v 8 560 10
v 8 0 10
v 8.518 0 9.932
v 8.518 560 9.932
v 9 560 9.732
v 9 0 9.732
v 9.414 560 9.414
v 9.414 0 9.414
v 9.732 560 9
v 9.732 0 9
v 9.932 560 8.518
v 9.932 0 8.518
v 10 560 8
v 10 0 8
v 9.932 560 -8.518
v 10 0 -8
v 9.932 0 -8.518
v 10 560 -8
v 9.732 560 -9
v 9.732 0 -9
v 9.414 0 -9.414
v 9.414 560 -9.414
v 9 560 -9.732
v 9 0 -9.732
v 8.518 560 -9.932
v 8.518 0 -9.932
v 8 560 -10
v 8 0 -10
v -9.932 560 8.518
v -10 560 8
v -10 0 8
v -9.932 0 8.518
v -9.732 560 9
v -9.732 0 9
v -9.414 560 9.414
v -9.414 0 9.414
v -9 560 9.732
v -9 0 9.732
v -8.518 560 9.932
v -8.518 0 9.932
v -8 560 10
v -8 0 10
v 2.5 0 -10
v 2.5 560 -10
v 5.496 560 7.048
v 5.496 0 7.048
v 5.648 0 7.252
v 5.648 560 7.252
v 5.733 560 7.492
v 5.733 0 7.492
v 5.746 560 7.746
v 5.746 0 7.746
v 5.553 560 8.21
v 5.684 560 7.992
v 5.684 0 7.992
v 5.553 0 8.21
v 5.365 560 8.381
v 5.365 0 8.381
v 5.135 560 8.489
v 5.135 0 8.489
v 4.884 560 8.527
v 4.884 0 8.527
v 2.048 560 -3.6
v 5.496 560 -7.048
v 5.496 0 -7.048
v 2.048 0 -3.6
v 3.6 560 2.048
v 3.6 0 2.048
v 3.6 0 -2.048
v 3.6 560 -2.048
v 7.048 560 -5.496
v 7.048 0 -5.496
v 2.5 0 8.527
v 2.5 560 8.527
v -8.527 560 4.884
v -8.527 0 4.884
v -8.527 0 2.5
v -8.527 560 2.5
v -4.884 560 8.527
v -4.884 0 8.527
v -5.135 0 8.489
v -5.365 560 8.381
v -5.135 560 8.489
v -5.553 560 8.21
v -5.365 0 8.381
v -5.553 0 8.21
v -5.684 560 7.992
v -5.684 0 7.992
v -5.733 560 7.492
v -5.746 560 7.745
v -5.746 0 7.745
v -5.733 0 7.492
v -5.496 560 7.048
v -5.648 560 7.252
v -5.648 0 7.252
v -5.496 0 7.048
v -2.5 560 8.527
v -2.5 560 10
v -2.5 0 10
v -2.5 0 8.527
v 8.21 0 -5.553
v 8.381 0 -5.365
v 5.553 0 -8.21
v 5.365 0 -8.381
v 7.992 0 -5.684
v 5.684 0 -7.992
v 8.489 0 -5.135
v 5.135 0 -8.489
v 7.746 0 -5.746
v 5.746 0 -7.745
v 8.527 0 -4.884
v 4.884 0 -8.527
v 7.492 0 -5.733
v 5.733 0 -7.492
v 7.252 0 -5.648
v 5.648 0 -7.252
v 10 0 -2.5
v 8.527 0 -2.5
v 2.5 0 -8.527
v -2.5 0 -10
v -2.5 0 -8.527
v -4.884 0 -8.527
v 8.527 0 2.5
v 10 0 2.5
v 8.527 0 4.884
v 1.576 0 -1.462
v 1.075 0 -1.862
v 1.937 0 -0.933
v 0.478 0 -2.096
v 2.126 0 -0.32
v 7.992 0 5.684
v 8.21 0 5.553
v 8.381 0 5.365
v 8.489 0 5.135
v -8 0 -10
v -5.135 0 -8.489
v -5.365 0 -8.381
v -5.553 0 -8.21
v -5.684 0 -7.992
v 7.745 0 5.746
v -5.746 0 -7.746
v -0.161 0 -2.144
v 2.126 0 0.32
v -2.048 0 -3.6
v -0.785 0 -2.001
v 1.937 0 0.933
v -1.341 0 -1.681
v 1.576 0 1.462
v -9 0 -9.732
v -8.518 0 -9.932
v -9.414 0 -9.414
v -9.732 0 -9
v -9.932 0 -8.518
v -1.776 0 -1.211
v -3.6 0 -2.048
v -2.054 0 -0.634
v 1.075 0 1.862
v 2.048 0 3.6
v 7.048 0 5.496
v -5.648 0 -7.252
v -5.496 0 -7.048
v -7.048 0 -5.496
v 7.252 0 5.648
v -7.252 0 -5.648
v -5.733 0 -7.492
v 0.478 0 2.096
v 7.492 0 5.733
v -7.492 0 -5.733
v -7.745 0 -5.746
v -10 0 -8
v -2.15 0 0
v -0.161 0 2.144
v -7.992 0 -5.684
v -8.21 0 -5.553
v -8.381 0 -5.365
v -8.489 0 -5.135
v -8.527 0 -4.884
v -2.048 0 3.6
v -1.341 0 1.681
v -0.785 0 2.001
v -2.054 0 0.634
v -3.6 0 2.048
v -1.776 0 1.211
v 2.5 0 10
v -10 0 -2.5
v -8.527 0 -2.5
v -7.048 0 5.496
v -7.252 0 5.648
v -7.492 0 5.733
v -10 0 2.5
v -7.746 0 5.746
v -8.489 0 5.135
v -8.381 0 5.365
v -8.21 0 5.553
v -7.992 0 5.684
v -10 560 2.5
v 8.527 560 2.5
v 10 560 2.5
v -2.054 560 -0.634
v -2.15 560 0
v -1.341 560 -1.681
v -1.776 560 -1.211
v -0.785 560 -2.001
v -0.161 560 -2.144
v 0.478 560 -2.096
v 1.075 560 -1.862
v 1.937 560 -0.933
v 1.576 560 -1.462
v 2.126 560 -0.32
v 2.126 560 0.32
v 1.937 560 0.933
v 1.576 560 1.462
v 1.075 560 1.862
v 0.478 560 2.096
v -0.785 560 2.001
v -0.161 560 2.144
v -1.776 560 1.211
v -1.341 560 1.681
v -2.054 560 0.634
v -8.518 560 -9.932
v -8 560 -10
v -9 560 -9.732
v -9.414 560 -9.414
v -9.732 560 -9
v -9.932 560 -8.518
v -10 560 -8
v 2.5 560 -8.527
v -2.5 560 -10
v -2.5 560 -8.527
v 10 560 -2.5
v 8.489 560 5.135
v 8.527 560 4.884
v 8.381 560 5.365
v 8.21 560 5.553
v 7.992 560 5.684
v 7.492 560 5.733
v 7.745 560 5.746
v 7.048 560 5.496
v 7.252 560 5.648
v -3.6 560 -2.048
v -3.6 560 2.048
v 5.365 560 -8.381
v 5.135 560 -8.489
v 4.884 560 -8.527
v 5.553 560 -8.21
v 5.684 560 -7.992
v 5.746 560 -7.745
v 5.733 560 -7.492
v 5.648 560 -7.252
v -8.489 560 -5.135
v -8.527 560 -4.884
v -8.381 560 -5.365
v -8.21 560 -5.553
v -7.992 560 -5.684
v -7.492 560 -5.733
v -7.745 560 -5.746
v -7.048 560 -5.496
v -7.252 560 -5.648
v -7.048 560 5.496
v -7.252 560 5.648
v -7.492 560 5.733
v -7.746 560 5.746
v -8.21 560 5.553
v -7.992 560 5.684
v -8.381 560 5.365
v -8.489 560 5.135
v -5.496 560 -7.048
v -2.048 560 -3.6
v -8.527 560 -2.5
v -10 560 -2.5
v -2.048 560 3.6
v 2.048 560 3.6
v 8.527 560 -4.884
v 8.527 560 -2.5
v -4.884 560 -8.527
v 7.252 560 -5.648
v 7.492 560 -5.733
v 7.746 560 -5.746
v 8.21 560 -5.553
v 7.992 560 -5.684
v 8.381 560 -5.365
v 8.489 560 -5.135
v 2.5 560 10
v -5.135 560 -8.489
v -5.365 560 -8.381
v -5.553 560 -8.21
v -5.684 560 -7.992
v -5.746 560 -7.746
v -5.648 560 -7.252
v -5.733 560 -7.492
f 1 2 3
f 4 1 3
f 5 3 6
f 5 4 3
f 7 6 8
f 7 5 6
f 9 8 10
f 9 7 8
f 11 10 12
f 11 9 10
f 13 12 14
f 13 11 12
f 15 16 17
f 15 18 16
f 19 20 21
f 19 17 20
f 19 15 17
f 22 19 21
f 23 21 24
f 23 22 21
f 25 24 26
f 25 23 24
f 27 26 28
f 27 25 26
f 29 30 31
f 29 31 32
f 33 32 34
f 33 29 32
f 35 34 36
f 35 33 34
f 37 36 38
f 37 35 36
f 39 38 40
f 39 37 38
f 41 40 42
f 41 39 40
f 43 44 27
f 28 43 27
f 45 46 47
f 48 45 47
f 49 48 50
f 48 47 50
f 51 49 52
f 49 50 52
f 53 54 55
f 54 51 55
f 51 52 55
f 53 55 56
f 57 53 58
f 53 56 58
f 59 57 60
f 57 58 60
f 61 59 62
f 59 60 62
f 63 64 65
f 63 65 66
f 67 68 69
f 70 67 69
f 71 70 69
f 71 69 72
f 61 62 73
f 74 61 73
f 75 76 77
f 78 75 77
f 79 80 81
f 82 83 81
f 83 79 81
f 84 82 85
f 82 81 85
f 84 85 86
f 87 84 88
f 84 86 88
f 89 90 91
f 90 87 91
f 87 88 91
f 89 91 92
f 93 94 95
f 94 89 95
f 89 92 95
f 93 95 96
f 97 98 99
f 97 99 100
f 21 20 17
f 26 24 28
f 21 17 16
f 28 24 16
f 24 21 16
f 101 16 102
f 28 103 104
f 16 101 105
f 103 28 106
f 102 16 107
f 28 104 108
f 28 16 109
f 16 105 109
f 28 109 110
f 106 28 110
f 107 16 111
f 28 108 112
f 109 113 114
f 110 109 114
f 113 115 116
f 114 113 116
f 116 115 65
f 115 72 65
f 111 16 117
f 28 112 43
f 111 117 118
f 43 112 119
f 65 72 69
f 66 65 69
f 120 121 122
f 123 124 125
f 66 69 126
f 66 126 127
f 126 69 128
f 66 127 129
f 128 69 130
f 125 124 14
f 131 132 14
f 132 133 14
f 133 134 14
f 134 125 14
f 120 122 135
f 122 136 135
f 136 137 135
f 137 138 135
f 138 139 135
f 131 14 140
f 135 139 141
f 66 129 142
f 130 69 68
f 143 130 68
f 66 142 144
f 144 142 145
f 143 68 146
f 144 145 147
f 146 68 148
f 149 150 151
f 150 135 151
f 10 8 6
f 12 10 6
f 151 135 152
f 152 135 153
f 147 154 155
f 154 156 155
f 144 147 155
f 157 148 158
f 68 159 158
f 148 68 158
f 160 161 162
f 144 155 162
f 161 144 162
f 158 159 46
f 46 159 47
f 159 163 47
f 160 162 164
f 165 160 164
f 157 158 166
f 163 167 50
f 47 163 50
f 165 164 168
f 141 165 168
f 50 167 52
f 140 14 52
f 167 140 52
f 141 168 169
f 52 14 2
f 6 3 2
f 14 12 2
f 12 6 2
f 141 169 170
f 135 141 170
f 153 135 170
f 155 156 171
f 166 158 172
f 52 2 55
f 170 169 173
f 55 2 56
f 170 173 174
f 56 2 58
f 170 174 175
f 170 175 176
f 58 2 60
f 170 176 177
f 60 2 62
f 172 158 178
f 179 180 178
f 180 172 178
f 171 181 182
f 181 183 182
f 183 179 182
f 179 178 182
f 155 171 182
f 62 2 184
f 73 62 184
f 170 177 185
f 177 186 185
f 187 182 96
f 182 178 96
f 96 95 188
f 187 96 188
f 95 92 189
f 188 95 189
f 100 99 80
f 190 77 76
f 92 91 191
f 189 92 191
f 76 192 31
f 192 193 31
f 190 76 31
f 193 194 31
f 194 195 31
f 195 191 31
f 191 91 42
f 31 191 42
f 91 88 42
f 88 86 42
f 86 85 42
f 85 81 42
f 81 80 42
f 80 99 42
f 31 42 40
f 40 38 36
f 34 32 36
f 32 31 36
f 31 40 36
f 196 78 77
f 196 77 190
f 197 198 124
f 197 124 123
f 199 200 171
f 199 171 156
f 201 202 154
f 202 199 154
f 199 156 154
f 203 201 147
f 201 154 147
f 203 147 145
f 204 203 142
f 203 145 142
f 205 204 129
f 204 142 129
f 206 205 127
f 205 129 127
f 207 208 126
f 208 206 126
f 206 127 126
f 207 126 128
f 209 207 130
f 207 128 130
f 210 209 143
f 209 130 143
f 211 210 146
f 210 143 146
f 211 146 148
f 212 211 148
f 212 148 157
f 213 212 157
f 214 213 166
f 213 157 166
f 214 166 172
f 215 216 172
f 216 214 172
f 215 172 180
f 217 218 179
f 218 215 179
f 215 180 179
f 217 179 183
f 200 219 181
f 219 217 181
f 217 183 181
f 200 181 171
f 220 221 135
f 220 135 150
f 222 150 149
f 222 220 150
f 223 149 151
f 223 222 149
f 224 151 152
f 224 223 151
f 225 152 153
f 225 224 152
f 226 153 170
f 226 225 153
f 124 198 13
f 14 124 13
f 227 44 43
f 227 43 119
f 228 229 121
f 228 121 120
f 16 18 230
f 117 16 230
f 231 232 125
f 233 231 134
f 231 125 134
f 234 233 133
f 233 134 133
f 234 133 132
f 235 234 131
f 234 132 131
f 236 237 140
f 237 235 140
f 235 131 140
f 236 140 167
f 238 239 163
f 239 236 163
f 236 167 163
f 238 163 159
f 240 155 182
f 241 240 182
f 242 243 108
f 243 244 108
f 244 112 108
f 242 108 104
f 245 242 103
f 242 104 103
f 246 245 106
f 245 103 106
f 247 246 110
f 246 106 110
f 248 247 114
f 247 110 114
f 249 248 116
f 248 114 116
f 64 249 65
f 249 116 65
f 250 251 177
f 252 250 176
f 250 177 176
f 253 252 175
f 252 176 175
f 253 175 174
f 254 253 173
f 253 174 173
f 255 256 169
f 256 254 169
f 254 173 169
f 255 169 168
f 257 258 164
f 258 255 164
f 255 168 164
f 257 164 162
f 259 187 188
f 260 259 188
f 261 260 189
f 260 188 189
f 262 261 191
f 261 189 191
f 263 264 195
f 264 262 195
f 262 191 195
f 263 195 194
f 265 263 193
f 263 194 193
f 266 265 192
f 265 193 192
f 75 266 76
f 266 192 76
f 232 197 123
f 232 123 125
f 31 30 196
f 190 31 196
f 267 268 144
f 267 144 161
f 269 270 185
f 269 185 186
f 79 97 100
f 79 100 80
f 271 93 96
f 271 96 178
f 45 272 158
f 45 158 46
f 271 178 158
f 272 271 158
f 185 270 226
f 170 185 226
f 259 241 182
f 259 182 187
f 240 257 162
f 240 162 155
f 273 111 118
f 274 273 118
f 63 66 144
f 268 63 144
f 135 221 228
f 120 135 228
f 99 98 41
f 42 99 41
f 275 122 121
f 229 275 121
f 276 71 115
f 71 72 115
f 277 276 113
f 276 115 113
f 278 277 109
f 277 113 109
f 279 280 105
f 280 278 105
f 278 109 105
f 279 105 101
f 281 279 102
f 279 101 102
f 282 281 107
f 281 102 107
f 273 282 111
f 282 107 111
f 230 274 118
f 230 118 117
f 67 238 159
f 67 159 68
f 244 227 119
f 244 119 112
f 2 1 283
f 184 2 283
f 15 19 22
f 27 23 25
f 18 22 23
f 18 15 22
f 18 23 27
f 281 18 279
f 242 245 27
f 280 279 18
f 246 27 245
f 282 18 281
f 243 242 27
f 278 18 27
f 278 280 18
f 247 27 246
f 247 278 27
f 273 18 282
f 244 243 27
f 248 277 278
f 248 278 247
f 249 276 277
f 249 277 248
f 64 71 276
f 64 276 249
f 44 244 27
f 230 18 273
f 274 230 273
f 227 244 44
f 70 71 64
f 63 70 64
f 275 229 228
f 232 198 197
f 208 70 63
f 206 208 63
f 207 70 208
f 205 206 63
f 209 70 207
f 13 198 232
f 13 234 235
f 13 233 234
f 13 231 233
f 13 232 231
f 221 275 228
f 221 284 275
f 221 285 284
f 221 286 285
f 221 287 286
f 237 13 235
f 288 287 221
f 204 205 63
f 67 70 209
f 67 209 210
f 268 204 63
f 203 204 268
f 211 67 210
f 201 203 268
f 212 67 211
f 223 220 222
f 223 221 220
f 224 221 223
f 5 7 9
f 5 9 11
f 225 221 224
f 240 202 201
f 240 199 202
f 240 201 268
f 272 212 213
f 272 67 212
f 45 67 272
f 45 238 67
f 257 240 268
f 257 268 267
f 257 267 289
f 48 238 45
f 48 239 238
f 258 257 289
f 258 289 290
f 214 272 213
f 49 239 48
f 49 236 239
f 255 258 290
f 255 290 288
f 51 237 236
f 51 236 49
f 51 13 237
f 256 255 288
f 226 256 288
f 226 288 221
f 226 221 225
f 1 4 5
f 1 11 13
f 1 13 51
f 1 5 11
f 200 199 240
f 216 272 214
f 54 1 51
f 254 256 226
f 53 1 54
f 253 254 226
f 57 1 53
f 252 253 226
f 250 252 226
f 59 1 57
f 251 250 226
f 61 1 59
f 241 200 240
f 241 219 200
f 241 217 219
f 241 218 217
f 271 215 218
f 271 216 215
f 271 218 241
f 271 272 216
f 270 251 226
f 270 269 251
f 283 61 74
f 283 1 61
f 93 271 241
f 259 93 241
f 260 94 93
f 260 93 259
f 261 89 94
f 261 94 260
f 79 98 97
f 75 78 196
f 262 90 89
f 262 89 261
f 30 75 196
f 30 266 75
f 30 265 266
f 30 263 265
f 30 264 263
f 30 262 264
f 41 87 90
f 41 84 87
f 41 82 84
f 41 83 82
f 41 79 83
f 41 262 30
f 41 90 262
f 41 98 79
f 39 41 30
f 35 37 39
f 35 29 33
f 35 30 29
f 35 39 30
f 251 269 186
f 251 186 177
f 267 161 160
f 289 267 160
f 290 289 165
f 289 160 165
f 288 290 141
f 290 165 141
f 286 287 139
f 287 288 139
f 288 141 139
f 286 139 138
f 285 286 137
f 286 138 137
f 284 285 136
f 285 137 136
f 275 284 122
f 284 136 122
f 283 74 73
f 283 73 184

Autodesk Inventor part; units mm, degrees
ref_plane "YZ Plane" through (0, 0, 0) normal (1, 0, 0) x (0, 1, 0)
ref_plane "XZ Plane" through (0, 0, 0) normal (0, 1, 0) x (-1, 0, 0)
ref_plane "XY Plane" through (0, 0, 0) normal (0, 0, 1) x (1, 0, 0)
sketch "Sketch1" plane through (0, 0, 0) normal (0, 1, 0) x (-1, 0, 0)
  circle A0 centre (0, 0) radius 2.15
  line L0 (-10, 10) -> (10, 10)
  line L1 (10, 10) -> (10, -10)
  line L2 (10, -10) -> (-10, -10)
  line L3 (-10, -10) -> (-10, 10)
  line L4 (-10, 10) -> (10, -10) construction
  line L5 (10, 10) -> (-10, -10) construction
  line L6 (10, -2.5) -> (8.5267, -2.5)
  line L7 (8.5267, -2.5) -> (8.5267, -4.8839)
  line L8 (7.0482, -5.4963) -> (3.6, -2.0481)
  line L9 (3.6, -2.0481) -> (3.6, 2.0481)
  line L10 (3.6, 2.0481) -> (7.0482, 5.4963)
  line L11 (8.5267, 4.8839) -> (8.5267, 2.5)
  line L12 (8.5267, 2.5) -> (10, 2.5)
  line L13 (0, 0) -> (10, 0) construction
  arc A1 (8.5267, 4.8839) -> (7.0482, 5.4963) centre (7.6606, 4.8839) ccw
  arc A2 (7.0482, -5.4963) -> (8.5267, -4.8839) centre (7.6606, -4.8839) ccw
  point P0 (8.5267, -6.9748)
  point P1 (8.5267, 6.9748)
  point P2 (3.6, 0)
  dimension "d0" = 4.3
  dimension "d1" = 20
  dimension "d2" = 20
  dimension "d3" = 5
  dimension "d4" = 6.4
  dimension "d14" = 11.5
extrude "Extrusion1" add sketch "Sketch1" along normal blind 560
extrude "Extrusion2" cut sketch "Sketch1" along normal blind 560 contours L1 L6 L7 A2 L8 L9 L10 A1 L11 L12
pattern_circular "Circular Pattern1" count 4 over 360 about axis through (0, -10, 0) along (0, 1, 0) of "Extrusion2"
fillet "Fillet1" radius 2 4 edges at (-10, 280, -10) (10, 280, -10) (10, 280, 10) (-10, 280, 10)
equation "\"d7\" = d5"
equation "\"d5\" = 560"
properties part number "8020"
